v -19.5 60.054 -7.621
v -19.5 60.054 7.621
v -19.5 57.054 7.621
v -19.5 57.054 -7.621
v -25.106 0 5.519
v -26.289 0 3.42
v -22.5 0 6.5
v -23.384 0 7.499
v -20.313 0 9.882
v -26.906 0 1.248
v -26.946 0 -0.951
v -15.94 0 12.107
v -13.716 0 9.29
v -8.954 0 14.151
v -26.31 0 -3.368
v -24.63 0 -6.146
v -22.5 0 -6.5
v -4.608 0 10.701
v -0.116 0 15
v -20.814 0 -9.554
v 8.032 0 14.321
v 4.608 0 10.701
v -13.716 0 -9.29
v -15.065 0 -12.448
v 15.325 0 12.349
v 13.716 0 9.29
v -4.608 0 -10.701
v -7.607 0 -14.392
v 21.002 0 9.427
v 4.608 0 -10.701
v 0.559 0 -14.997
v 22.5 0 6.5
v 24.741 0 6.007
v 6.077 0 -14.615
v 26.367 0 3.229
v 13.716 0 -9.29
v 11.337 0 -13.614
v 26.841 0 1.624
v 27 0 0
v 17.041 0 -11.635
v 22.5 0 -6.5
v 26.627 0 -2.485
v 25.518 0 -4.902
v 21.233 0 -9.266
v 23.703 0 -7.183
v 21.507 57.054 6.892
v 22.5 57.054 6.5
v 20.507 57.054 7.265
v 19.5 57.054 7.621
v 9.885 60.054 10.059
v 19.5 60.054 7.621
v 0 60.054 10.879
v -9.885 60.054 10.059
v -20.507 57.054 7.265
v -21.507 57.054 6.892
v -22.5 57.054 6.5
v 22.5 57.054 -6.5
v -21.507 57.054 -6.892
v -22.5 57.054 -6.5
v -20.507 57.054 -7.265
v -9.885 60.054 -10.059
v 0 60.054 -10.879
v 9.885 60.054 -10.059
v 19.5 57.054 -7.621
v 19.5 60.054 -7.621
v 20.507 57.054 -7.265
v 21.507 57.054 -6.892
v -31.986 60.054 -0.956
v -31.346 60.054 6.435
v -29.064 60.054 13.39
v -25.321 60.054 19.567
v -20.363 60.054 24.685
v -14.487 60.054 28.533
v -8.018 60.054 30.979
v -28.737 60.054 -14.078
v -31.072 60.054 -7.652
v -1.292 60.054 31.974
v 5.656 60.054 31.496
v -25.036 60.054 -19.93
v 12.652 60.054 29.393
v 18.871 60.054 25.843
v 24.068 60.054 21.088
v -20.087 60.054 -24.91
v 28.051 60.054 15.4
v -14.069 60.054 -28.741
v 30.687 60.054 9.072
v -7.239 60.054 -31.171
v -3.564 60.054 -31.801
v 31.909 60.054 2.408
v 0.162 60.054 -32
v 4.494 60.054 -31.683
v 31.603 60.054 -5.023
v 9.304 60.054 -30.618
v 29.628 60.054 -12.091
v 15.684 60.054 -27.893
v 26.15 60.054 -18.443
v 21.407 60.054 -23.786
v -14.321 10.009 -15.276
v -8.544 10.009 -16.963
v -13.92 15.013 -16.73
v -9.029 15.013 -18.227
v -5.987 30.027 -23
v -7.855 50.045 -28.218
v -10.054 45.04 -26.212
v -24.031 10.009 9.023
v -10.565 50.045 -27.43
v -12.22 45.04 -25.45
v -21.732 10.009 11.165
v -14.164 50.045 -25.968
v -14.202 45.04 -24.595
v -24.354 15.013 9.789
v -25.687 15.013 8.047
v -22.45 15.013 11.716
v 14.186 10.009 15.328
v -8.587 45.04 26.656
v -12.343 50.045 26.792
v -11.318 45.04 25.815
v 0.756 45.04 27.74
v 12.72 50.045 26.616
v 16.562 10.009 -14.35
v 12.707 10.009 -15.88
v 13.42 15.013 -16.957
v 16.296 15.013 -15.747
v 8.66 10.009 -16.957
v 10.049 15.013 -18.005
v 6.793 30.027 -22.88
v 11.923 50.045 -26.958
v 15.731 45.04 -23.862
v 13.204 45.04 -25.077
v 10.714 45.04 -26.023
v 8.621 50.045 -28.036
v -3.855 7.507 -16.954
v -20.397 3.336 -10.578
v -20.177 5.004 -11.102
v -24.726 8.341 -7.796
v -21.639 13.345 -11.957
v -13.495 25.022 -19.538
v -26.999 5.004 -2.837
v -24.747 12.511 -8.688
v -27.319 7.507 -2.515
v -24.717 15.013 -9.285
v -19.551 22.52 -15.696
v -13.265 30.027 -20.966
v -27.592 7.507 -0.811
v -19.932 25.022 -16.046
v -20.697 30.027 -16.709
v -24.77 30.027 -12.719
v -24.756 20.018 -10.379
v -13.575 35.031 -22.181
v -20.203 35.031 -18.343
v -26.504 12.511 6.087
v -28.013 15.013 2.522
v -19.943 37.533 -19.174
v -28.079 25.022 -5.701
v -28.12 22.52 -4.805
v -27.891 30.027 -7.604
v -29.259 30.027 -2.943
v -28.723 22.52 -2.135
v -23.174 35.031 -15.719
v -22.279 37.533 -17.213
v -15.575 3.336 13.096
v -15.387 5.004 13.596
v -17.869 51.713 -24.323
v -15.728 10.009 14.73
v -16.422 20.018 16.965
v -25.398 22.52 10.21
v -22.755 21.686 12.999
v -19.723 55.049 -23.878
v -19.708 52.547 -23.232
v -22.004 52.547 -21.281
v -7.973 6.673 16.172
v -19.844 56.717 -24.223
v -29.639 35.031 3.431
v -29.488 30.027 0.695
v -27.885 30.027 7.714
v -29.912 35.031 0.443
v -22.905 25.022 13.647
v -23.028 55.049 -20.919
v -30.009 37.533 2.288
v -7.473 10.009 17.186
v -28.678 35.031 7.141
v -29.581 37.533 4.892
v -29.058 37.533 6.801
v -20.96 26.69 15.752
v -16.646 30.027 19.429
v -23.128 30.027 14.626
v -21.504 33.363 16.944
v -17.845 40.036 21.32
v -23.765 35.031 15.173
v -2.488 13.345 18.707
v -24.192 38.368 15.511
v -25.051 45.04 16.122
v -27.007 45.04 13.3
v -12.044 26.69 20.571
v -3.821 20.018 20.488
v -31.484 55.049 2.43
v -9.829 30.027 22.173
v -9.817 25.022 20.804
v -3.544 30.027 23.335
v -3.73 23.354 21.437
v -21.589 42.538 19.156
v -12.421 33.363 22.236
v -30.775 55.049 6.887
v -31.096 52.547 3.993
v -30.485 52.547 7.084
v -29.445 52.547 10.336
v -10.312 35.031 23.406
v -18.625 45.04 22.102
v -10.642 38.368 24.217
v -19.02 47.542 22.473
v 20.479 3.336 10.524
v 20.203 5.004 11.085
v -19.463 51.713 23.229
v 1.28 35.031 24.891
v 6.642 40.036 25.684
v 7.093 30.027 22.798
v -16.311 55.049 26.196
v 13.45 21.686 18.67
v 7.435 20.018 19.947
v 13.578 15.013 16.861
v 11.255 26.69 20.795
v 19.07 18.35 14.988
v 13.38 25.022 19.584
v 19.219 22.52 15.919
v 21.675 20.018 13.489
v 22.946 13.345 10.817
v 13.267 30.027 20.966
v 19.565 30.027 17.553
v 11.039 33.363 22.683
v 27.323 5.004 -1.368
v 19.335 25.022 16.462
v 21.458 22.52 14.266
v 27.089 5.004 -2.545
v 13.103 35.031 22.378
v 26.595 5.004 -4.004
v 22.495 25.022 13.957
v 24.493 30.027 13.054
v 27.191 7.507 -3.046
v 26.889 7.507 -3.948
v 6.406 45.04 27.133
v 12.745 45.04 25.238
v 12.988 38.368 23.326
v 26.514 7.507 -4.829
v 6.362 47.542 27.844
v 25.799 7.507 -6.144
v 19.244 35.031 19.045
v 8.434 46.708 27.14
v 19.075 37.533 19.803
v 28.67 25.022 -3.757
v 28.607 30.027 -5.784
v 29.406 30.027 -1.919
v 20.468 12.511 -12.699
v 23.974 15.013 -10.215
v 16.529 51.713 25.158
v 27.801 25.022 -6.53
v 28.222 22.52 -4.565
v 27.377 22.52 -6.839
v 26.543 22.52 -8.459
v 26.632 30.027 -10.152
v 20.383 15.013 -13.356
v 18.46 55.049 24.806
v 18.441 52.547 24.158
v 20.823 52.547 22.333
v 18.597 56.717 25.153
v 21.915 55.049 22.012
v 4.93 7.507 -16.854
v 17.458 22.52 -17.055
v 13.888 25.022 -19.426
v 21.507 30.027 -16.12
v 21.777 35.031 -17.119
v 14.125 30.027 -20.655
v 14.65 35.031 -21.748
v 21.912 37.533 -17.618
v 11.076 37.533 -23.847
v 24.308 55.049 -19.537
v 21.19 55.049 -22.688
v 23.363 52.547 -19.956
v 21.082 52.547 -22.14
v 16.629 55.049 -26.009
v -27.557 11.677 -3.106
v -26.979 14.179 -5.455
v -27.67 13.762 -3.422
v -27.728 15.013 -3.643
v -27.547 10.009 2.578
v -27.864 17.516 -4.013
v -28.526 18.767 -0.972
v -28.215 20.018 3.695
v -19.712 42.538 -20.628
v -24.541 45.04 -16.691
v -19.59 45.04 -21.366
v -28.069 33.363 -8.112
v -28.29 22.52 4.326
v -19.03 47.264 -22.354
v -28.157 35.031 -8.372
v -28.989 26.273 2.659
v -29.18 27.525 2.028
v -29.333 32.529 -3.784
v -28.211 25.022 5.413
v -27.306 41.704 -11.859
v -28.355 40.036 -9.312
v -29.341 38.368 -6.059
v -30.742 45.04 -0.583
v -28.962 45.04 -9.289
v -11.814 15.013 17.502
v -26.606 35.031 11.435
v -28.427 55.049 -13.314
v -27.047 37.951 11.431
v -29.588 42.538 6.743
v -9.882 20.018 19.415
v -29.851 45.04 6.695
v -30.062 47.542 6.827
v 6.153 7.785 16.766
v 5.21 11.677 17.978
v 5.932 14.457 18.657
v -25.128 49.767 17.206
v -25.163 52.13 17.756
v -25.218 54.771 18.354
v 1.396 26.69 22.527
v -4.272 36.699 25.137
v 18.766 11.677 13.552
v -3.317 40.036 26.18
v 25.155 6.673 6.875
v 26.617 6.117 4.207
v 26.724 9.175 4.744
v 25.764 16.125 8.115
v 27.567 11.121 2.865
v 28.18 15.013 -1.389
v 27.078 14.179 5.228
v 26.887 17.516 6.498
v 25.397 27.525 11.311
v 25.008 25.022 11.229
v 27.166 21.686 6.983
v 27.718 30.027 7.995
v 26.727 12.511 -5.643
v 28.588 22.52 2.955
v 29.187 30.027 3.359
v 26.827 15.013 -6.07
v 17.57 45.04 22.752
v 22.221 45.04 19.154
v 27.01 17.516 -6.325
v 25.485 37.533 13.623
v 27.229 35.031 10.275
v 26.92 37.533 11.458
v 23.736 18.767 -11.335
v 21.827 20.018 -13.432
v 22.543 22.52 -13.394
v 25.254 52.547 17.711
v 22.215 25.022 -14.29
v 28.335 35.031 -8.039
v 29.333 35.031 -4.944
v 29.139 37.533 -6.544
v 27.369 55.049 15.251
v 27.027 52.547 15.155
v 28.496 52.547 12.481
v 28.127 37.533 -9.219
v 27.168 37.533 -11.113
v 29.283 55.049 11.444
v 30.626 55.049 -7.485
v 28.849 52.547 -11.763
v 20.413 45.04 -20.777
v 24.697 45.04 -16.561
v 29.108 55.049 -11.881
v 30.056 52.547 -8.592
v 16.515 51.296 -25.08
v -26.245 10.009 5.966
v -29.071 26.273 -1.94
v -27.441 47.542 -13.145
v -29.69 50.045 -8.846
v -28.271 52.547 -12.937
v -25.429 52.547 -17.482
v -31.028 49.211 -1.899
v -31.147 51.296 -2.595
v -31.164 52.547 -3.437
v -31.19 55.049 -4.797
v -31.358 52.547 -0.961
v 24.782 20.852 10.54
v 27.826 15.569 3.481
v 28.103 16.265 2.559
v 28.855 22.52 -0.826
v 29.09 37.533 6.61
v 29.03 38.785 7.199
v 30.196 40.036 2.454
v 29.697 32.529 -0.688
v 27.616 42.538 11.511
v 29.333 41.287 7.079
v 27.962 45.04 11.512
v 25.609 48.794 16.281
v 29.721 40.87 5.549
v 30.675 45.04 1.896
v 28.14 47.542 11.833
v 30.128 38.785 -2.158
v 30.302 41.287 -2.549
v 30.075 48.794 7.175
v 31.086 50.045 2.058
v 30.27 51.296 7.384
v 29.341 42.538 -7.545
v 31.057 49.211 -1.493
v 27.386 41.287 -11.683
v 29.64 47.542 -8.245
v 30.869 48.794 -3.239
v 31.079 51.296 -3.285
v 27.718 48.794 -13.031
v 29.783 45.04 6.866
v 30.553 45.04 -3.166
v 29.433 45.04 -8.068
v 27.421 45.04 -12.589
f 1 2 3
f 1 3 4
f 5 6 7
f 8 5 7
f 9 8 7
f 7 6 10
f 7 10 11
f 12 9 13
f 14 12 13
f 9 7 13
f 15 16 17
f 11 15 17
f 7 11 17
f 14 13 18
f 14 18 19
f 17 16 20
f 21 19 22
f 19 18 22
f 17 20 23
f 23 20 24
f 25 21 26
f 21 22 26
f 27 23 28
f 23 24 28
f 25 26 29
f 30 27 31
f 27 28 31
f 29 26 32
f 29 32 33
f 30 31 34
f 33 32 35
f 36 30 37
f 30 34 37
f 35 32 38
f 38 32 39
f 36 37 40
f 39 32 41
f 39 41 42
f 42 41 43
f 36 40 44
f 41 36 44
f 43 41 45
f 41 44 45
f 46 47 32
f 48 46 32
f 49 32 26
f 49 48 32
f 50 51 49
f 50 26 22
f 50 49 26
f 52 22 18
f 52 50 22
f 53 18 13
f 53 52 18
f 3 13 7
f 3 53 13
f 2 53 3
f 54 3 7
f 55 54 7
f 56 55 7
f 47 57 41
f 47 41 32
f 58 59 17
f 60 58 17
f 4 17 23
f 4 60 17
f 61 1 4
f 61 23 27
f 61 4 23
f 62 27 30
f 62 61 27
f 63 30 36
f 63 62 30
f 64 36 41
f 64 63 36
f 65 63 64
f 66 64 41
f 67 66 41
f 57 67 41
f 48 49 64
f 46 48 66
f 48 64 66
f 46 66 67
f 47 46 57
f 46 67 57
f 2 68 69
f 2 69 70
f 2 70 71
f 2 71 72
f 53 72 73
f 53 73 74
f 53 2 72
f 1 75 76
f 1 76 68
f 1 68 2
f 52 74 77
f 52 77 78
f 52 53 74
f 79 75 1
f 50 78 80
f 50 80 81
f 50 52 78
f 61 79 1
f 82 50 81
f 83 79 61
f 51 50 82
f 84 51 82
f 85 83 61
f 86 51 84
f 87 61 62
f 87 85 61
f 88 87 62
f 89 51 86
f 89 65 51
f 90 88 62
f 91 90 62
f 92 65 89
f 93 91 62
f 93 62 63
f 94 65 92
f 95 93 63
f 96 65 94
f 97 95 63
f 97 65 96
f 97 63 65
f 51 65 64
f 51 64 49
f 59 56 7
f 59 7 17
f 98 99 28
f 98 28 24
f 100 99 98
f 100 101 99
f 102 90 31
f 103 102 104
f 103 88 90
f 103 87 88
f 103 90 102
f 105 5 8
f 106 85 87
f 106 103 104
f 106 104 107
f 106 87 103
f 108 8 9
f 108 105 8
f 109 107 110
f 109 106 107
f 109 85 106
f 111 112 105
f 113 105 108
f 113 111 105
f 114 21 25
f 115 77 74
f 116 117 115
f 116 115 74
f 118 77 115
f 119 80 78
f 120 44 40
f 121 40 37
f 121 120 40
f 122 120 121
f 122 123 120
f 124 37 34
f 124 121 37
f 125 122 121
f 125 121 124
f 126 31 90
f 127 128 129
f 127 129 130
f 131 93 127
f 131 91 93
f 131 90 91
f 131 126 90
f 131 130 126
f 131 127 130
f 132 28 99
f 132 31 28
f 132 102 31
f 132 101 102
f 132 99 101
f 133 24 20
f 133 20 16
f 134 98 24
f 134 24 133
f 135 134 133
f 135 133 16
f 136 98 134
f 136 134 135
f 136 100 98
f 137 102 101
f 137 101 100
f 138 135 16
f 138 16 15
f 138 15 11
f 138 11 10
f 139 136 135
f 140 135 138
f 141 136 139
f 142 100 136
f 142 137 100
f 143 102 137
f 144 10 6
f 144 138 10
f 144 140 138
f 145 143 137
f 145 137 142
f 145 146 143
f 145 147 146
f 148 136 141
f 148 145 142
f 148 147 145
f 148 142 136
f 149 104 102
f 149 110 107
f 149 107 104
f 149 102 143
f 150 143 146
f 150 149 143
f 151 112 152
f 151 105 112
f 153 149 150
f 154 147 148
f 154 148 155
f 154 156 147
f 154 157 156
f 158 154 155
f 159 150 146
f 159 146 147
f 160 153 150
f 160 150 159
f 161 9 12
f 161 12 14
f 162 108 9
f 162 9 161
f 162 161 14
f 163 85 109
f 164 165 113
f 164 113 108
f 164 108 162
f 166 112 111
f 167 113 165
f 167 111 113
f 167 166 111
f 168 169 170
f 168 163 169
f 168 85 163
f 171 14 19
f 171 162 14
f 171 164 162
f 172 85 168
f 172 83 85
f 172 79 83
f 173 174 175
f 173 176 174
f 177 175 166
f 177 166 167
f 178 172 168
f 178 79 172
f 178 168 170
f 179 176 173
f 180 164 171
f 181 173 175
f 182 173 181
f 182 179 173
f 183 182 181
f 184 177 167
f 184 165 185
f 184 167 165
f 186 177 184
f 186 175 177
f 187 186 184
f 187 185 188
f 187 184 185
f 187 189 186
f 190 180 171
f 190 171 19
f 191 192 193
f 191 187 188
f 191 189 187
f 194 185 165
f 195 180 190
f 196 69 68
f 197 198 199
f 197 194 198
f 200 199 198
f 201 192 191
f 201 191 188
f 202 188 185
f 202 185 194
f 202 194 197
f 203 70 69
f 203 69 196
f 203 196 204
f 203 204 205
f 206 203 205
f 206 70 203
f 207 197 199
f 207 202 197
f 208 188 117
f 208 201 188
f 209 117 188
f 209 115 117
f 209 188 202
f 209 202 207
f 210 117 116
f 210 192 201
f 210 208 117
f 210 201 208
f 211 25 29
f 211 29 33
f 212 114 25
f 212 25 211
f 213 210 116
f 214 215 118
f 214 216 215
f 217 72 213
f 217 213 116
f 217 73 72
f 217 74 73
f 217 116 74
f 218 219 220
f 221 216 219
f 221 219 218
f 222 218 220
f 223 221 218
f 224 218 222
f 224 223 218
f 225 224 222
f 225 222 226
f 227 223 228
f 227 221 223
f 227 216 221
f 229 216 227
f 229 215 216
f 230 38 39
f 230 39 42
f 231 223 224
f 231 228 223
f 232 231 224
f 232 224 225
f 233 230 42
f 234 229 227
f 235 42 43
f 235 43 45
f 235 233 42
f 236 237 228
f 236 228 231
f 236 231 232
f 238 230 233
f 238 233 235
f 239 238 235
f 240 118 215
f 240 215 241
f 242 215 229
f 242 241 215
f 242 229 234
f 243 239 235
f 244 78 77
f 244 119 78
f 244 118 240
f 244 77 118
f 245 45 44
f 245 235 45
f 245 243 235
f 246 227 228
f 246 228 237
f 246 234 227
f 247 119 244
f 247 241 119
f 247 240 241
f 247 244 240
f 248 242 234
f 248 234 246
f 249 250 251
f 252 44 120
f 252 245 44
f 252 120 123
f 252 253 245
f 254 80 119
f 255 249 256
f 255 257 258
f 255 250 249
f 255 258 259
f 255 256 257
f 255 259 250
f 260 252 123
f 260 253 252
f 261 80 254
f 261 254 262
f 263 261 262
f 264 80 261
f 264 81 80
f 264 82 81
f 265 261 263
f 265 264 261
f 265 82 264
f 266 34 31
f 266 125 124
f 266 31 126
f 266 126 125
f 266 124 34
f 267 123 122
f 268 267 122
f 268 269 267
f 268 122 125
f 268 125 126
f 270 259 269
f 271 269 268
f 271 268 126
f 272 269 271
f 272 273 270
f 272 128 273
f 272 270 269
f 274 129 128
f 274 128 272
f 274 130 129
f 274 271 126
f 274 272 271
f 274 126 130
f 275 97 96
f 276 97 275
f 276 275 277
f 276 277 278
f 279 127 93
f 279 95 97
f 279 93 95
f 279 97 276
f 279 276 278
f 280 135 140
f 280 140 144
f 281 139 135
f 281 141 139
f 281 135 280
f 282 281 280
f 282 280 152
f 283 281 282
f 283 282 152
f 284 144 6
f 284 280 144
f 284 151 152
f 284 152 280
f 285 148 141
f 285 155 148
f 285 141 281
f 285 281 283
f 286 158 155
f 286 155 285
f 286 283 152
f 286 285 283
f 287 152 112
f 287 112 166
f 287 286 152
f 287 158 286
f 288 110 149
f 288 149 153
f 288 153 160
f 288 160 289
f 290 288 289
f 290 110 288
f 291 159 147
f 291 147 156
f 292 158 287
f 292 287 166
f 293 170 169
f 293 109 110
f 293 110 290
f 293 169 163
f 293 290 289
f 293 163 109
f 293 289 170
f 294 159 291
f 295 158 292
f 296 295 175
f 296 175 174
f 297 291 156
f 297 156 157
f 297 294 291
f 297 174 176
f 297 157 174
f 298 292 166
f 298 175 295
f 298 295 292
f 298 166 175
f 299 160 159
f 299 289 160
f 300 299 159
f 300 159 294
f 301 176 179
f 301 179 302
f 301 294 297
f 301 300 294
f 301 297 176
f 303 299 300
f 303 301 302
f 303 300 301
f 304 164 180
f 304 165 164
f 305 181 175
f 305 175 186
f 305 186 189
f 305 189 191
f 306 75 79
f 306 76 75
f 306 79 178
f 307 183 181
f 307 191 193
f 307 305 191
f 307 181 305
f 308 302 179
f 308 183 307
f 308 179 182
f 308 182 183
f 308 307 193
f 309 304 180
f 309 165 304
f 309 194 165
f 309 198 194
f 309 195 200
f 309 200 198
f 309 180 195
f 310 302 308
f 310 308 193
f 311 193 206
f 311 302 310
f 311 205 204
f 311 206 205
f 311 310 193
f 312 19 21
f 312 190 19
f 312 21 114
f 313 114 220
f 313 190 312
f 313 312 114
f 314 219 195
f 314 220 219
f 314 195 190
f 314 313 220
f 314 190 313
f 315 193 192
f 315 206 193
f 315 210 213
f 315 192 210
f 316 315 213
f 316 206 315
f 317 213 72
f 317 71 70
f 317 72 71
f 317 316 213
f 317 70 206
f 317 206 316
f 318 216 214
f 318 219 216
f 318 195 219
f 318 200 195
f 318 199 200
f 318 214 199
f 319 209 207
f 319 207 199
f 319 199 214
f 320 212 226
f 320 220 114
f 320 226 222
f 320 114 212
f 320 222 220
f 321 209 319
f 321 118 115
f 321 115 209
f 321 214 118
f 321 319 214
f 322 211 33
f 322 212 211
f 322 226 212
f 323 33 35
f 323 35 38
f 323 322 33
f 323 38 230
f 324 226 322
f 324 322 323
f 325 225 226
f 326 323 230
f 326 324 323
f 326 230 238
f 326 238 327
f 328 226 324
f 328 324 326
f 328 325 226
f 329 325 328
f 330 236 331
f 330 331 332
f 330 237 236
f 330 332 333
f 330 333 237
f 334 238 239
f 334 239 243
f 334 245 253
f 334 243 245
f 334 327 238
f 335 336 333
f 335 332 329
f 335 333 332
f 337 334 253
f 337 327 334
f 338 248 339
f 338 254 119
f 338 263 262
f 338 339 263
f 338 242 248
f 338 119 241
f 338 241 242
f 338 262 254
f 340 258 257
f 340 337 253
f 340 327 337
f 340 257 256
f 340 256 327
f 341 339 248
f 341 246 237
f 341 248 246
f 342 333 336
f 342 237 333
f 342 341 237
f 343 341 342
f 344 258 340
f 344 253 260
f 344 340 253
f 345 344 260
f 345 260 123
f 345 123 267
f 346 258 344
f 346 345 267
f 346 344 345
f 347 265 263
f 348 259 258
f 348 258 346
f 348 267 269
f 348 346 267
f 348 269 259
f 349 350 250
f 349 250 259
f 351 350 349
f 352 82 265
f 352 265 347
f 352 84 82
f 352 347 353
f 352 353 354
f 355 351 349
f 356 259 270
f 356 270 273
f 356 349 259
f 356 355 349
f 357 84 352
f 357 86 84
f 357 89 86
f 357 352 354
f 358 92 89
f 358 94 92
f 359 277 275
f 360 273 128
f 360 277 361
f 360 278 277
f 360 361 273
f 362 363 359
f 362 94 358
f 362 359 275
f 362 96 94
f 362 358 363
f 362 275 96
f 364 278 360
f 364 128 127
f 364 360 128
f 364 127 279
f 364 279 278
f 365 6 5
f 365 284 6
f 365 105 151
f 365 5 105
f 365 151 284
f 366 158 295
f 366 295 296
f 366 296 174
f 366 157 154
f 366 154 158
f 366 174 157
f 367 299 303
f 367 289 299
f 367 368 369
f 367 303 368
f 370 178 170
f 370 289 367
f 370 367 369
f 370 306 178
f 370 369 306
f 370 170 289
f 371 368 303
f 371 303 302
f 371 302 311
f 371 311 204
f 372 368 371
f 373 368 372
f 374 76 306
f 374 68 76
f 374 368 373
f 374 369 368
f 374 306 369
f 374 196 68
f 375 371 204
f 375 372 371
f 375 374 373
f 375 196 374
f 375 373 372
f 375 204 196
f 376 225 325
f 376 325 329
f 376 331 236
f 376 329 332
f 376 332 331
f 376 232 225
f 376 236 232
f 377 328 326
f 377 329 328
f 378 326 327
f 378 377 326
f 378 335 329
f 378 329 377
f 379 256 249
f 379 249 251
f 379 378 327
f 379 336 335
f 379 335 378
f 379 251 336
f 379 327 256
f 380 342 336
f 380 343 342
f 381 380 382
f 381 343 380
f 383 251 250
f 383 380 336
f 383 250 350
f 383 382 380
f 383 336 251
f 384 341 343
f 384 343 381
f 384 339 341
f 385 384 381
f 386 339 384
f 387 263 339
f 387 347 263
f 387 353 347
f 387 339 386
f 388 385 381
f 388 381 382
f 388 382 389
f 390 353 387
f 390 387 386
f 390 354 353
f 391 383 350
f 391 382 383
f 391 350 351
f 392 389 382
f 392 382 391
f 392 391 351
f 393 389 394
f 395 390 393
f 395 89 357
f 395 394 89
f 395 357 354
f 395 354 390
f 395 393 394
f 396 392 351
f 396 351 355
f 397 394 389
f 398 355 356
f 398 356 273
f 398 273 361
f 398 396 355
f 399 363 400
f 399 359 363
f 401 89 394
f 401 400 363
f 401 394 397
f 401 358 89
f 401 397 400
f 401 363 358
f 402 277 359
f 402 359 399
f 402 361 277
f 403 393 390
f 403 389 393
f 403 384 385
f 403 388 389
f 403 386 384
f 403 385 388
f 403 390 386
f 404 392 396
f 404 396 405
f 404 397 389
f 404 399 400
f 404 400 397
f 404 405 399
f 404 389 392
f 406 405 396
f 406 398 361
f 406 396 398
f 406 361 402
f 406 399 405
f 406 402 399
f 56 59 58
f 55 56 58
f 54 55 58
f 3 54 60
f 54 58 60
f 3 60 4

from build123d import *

# Parameters (mm, degrees)
SKETCH3_RX          = 27
SKETCH3_RY          = 15
BOSS_EXTRUDE1_DEPTH = 60.053544519
CUT_EXTRUDE1_DEPTH  = 99
BOSS_EXTRUDE2_DEPTH = 3


with BuildPart() as part:
    # Sketch3 → Boss-Extrude1 (new body)
    with BuildSketch(Plane(origin=(0, 0, 0), x_dir=(1, 0, 0), z_dir=(0, 1, 0))):
        with Locations((0, 0)):
            Ellipse(SKETCH3_RX, SKETCH3_RY)
        with BuildLine():
            Line((22.5, 6.5), (22.5, -6.5))
            ThreePointArc((22.5, -6.5), (0, -10.878511347), (-22.5, -6.5))
            Line((-22.5, -6.5), (-22.5, 6.5))
            ThreePointArc((-22.5, 6.5), (0, 10.878511347), (22.5, 6.5))
        make_face(mode=Mode.SUBTRACT)
    extrude(amount=BOSS_EXTRUDE1_DEPTH)

    # Loft9: read off the stored shape, not the designer's step
    # Loft9: loft between two sections, ruled curve by curve
    loft9_from = [
        Edge.make_bspline([(0.559362113, 0, -14.996780663), (-53.429048274, 0, -15.618294122), (-54.5477725, 0, 14.375267204), (-0.559362113, 0, 14.996780663), (53.429048274, 0, 15.618294122), (54.5477725, 0, -14.375267204), (0.559362113, 0, -14.996780663)], [0, 0, 0, 0, 0.5, 0.5, 0.5, 1, 1, 1, 1], 3, [1, 0.333333333, 0.333333333, 1, 0.333333333, 0.333333333, 1]),
    ]
    loft9_to = [
        Edge.make_bspline([(0.162188065, 60.053544519, -31.999588982), (-63.836989899, 60.053544519, -32.323965112), (-64.16136603, 60.053544519, 31.675212852), (-0.162188065, 60.053544519, 31.999588982), (63.836989899, 60.053544519, 32.323965112), (64.16136603, 60.053544519, -31.675212852), (0.162188065, 60.053544519, -31.999588982)], [0, 0, 0, 0, 0.5, 0.5, 0.5, 1, 1, 1, 1], 3, [1, 0.333333333, 0.333333333, 1, 0.333333333, 0.333333333, 1]),
    ]
    loft9 = Solid(Shell([*[Face.make_surface_from_curves(loft9_from[k], loft9_to[k]) for k in range(1)], Face(Wire(loft9_from)), Face(Wire(loft9_to))]))
    add(loft9)

    # Sketch5 → Cut-Extrude1 (cut)
    with BuildSketch(Plane(origin=(0, 60.053544519, 0), x_dir=(1, 0, 0), z_dir=(0, 1, 0))):
        with BuildLine():
            Line((22.5, 6.5), (22.5, -6.5))
            ThreePointArc((22.5, -6.5), (0, -10.878511347), (-22.5, -6.5))
            Line((-22.5, -6.5), (-22.5, 6.5))
            ThreePointArc((-22.5, 6.5), (0, 10.878511347), (22.5, 6.5))
        make_face()
    extrude(amount=-CUT_EXTRUDE1_DEPTH, mode=Mode.SUBTRACT)

    # Sketch5<4> → Boss-Extrude2 (add)
    with BuildSketch(Plane(origin=(0, 60.053544519, 0), x_dir=(1, 0, 0), z_dir=(0, 1, 0))):
        with BuildLine():
            Line((-19.5, -7.621352305), (-19.5, 7.621352305))
            ThreePointArc((-19.5, 7.621352305), (-21.007483375, 7.080696734), (-22.5, 6.5))
            Line((-22.5, 6.5), (-22.5, -6.5))
            ThreePointArc((-22.5, -6.5), (-21.007483375, -7.080696734), (-19.5, -7.621352305))
        make_face()
        with BuildLine():
            Line((22.5, -6.5), (22.5, 6.5))
            ThreePointArc((22.5, 6.5), (21.007483375, 7.080696734), (19.5, 7.621352305))
            Line((19.5, 7.621352305), (19.5, -7.621352305))
            ThreePointArc((19.5, -7.621352305), (21.007483375, -7.080696734), (22.5, -6.5))
        make_face()
    extrude(amount=-BOSS_EXTRUDE2_DEPTH)


solid = part.part
